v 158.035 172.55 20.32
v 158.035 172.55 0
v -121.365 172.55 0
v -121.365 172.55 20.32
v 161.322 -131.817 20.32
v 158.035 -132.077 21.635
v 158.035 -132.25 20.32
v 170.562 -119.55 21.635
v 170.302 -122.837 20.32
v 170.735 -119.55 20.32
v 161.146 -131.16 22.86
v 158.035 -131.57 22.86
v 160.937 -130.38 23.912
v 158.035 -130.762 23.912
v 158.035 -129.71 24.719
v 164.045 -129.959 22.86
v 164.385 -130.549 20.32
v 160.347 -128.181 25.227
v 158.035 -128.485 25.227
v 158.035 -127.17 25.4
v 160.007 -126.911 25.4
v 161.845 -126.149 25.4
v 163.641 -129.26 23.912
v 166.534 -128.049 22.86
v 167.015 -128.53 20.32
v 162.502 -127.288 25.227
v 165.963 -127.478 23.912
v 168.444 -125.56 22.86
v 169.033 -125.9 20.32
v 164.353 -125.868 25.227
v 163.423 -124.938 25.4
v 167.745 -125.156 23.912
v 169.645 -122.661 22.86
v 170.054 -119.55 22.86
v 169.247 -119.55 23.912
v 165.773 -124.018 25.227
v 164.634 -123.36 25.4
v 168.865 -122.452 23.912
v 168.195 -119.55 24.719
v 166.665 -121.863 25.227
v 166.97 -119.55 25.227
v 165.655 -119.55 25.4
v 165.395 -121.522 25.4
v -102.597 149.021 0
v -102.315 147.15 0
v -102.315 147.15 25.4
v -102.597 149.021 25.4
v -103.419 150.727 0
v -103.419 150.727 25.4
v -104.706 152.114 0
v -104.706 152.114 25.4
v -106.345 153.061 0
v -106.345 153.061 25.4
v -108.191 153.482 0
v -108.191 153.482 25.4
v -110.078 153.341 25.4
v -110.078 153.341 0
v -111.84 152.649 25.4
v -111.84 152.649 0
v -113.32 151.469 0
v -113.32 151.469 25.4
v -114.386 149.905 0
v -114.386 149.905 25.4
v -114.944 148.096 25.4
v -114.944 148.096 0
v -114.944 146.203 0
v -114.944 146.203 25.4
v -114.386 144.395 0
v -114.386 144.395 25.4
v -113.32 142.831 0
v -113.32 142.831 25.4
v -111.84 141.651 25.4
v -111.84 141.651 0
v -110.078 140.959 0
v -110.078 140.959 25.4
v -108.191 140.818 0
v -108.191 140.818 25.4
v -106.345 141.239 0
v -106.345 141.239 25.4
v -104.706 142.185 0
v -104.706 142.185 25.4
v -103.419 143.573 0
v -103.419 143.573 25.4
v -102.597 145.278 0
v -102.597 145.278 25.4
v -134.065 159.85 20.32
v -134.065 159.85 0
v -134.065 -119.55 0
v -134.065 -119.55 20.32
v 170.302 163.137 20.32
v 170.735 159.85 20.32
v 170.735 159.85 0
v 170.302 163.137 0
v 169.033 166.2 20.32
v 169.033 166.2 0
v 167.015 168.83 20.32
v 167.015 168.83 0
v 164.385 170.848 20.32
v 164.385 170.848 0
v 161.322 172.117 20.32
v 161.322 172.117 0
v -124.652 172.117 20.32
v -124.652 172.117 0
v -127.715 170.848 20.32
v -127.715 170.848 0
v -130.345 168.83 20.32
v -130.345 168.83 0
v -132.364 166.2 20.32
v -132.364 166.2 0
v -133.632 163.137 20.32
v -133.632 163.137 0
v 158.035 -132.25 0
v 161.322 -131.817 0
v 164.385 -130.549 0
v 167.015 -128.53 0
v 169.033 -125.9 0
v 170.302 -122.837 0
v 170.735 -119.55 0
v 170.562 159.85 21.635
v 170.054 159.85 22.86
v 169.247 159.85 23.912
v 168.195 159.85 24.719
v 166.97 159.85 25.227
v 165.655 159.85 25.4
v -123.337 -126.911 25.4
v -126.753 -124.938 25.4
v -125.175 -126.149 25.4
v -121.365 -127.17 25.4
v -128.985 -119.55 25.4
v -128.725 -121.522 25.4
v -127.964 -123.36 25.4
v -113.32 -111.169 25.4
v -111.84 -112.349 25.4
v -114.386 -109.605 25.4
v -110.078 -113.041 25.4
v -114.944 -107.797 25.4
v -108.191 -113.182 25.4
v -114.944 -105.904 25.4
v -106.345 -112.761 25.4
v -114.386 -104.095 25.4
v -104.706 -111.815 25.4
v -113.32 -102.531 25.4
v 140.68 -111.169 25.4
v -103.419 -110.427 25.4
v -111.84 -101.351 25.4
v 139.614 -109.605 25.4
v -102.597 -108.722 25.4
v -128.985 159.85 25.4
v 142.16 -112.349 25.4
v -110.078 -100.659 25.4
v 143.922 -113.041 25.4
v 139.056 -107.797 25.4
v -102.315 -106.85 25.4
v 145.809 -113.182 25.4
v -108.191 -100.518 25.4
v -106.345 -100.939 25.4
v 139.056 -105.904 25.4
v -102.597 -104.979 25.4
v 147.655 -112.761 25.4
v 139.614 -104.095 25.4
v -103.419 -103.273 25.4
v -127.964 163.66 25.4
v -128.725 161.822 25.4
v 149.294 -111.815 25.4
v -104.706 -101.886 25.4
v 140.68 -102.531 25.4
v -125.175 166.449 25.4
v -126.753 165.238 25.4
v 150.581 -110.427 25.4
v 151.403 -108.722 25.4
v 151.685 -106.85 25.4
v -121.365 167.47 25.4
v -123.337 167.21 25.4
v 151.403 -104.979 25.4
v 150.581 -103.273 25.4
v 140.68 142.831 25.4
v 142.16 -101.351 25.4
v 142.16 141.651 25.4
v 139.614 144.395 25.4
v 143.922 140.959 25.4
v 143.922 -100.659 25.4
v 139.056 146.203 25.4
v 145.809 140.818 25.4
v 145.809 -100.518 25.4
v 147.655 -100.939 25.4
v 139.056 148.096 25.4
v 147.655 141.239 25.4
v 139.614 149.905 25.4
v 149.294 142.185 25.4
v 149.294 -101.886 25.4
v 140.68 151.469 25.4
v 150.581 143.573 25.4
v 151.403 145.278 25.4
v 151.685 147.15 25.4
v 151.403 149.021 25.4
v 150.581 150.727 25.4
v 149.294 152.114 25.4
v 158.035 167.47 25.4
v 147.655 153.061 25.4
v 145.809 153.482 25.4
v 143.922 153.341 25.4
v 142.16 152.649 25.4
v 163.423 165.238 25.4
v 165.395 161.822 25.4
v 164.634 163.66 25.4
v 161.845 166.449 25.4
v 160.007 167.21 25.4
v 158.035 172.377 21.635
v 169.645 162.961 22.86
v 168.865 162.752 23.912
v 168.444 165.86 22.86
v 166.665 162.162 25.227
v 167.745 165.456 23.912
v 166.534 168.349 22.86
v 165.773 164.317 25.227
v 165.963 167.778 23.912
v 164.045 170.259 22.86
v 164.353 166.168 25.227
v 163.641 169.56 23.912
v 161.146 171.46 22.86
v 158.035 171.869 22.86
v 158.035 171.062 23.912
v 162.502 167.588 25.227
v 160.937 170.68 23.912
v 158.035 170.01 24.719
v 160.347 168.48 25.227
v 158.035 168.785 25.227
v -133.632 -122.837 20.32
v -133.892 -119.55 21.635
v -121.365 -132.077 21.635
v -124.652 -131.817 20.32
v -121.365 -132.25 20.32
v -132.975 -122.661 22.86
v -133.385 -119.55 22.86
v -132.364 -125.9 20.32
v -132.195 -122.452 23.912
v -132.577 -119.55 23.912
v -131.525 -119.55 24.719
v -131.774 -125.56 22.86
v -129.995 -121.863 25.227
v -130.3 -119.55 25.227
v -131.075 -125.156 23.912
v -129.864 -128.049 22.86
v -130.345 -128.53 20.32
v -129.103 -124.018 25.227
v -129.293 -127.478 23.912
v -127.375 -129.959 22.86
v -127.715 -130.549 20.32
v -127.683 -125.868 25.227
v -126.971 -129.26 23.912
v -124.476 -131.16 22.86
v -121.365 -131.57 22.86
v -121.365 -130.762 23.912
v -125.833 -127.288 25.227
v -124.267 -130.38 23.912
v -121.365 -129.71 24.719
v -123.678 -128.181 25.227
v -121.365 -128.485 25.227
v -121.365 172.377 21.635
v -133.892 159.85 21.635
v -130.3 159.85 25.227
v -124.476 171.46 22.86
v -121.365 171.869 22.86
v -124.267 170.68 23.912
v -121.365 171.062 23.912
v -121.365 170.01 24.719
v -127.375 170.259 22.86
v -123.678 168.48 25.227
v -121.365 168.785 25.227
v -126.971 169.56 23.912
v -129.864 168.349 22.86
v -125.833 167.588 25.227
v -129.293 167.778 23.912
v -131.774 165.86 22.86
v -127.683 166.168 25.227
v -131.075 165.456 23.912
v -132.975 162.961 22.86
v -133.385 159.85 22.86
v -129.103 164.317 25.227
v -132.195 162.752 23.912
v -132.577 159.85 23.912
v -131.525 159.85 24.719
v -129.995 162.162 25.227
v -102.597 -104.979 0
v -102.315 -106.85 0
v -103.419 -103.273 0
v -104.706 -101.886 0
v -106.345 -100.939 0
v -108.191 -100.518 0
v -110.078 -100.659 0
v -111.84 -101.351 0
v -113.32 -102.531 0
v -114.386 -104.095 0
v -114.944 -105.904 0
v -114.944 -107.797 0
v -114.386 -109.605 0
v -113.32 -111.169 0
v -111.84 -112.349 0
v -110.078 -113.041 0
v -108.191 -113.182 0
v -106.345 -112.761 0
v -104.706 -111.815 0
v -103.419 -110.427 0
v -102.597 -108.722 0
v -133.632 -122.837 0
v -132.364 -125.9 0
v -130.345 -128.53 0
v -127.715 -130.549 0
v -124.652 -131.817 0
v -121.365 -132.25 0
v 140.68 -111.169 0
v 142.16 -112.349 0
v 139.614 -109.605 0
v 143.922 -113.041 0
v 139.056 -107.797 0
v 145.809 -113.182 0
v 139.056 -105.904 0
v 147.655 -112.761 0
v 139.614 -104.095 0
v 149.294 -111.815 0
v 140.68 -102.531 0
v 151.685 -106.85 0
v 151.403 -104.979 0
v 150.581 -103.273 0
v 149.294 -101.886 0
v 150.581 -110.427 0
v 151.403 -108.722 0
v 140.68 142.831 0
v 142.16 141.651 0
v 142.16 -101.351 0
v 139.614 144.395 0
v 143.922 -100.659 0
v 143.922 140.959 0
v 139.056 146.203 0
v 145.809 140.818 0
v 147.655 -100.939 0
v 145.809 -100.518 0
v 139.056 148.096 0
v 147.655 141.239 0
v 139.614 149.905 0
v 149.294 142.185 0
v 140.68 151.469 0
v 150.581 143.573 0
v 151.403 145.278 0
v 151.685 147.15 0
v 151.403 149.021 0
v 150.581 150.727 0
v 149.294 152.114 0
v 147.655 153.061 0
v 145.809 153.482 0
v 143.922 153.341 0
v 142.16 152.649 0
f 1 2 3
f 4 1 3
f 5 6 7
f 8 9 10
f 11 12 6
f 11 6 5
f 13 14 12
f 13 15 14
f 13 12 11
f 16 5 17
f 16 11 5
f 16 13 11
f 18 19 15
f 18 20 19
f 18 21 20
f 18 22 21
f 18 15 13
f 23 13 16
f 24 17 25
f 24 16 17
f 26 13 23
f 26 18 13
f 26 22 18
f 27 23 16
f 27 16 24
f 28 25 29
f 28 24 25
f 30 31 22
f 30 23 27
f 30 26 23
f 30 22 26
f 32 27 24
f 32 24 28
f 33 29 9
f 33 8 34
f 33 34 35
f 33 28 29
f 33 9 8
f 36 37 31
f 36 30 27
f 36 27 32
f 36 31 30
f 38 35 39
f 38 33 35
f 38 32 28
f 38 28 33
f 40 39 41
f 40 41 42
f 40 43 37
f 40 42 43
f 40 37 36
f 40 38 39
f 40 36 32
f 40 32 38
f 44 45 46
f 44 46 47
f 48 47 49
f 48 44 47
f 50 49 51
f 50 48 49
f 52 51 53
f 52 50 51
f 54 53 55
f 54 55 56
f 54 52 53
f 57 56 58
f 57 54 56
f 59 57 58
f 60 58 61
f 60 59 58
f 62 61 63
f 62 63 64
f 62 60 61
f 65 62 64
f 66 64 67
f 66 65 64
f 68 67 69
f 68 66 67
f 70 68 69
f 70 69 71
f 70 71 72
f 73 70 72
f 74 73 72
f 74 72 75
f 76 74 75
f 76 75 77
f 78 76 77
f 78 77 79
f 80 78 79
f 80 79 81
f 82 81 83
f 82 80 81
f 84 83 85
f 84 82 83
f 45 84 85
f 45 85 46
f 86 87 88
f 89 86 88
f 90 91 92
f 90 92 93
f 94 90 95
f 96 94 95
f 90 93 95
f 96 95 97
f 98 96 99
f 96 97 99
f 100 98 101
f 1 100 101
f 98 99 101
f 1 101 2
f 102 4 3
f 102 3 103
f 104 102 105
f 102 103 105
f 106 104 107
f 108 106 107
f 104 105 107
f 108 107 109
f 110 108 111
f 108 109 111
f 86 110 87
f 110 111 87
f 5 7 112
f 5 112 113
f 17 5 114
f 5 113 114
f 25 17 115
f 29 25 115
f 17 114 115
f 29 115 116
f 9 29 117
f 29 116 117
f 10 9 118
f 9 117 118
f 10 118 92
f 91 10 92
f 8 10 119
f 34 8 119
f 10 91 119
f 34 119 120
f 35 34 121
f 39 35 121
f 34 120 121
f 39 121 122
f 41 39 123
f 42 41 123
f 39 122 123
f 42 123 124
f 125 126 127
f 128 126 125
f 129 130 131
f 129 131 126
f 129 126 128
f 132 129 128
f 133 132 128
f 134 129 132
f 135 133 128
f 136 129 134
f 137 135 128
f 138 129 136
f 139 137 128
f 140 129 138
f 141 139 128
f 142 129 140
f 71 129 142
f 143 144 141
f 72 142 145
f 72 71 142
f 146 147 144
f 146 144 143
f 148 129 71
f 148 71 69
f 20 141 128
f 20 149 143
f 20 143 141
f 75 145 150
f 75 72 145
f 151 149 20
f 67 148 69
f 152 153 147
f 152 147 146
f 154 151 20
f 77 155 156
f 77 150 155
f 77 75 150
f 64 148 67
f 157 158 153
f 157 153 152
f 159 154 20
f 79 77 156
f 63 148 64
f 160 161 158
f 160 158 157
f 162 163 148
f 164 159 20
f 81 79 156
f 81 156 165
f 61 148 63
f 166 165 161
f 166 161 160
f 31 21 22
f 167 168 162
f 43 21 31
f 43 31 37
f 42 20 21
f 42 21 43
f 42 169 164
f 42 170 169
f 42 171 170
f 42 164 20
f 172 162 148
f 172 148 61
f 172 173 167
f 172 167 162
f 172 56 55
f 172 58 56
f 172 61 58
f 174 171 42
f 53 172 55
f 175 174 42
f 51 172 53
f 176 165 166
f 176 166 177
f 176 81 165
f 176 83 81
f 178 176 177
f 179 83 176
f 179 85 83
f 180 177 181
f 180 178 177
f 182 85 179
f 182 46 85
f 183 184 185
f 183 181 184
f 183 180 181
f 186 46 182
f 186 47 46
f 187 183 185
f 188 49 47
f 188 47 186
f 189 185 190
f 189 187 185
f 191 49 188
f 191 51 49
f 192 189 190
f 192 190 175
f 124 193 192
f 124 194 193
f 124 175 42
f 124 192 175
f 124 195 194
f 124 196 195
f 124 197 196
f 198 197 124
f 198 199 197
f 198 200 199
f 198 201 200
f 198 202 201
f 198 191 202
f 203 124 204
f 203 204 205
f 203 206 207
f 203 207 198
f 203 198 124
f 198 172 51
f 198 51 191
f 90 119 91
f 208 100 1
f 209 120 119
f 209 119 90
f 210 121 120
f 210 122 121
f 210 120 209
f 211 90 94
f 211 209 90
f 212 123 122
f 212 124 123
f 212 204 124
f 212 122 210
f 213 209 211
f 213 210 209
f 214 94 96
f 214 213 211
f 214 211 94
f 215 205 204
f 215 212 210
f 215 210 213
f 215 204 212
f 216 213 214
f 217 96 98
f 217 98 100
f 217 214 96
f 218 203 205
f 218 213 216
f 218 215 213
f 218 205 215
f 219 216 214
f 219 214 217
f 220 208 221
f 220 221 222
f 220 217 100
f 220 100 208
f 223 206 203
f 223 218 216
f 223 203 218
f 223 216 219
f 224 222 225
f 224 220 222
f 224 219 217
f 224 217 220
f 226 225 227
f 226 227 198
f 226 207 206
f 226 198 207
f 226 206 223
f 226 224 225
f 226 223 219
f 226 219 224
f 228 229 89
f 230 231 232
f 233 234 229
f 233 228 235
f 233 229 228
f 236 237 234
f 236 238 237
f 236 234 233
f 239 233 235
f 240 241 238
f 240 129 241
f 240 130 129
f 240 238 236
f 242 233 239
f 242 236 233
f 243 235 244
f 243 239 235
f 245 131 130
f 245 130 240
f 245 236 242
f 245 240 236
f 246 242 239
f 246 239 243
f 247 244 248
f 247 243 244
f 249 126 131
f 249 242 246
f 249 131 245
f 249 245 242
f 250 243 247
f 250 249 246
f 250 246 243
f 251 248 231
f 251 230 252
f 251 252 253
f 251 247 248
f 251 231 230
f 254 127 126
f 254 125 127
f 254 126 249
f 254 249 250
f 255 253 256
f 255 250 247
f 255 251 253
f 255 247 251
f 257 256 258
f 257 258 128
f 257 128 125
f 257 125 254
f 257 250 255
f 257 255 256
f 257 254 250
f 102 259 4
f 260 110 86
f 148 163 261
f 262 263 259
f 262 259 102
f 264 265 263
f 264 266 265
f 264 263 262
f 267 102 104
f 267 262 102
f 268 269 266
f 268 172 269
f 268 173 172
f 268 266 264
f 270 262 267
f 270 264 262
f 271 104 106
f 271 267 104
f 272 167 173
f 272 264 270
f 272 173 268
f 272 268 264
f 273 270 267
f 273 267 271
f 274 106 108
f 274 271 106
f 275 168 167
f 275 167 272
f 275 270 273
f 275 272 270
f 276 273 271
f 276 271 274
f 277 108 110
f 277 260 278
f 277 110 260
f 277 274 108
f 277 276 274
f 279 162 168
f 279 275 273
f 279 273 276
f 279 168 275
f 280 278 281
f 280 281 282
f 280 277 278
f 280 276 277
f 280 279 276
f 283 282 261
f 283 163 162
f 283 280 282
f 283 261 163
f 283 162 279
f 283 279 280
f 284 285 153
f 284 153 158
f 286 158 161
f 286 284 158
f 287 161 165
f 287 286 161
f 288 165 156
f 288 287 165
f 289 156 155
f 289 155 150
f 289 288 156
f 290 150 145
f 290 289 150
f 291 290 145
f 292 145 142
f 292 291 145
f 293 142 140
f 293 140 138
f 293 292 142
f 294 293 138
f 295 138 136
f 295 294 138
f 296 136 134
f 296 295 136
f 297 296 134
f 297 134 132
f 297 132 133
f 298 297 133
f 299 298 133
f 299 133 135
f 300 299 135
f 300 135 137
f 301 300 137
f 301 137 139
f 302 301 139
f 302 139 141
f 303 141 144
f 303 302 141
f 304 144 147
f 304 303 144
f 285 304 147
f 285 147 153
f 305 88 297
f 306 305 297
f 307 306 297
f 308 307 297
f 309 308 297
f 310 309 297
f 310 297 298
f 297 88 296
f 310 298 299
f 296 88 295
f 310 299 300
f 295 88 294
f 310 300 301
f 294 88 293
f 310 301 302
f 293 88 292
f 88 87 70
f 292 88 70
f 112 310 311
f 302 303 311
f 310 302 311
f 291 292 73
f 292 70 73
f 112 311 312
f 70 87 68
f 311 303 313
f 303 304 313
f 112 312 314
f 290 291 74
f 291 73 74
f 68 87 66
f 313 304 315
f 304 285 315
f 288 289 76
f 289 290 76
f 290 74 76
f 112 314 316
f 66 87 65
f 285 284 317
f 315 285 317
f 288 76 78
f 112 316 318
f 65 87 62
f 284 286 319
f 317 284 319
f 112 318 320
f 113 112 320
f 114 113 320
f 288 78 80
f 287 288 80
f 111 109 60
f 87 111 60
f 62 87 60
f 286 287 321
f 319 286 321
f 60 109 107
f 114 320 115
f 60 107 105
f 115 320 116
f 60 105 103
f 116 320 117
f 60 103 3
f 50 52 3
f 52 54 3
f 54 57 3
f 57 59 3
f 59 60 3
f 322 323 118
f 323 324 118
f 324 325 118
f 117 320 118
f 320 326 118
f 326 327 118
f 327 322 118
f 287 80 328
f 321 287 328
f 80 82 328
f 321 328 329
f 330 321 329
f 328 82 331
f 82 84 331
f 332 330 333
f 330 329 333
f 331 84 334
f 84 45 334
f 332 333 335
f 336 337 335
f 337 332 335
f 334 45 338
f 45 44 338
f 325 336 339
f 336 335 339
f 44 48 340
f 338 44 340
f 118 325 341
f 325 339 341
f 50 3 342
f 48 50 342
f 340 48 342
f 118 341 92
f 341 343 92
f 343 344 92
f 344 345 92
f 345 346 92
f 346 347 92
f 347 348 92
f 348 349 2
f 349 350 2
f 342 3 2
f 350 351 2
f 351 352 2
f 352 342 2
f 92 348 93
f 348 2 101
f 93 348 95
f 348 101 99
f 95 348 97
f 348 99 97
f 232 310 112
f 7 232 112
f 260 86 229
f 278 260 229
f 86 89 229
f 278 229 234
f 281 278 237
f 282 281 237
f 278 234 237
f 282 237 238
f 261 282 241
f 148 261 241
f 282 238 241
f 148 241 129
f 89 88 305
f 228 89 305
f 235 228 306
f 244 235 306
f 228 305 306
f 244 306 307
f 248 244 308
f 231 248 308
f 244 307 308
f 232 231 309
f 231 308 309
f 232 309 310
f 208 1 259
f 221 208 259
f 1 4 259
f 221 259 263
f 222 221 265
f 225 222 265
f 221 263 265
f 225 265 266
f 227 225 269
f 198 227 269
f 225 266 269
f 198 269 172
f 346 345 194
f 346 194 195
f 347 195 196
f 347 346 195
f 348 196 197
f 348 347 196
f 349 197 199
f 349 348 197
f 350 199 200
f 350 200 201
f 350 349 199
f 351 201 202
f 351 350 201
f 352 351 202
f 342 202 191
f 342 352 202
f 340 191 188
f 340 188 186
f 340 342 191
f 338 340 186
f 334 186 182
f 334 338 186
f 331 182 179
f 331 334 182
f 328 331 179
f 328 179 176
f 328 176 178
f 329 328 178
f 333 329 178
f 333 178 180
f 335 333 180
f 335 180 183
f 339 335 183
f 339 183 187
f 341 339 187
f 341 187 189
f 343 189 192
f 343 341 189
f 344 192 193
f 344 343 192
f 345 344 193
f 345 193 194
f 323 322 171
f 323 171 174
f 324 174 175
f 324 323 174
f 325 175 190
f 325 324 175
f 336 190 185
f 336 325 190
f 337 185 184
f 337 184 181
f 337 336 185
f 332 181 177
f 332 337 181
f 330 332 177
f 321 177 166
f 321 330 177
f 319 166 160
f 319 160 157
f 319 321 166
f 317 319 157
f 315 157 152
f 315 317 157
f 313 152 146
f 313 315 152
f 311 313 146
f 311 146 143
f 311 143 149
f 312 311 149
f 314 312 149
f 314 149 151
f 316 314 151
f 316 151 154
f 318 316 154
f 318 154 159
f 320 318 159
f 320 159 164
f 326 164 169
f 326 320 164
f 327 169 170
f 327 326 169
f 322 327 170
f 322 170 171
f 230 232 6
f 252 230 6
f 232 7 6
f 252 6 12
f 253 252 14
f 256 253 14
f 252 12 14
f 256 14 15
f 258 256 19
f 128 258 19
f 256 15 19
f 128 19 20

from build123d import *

# Parameters (mm, degrees)
F0_R     = 6.35
F1_DEPTH = 25.4
F2_R     = 5.08


with BuildPart() as f1:
    # F0 (on Top) → F1 (new body)
    with BuildSketch(Plane.XY):
        with BuildLine():
            Line((158.034882, 172.549802), (-121.365118, 172.549802))
            ThreePointArc((-121.365118, 172.549802), (-130.345374, 168.830058), (-134.065118, 159.849802))
            Line((-134.065118, 159.849802), (-134.065118, -119.550198))
            ThreePointArc((-134.065118, -119.550198), (-130.345374, -128.530454), (-121.365118, -132.250198))
            Line((-121.365118, -132.250198), (158.034882, -132.250198))
            ThreePointArc((158.034882, -132.250198), (167.015138, -128.530454), (170.734882, -119.550198))
            Line((170.734882, -119.550198), (170.734882, 159.849802))
            ThreePointArc((170.734882, 159.849802), (167.015138, 168.830058), (158.034882, 172.549802))
        make_face()
        with Locations((-108.665118, -106.850198)):
            Circle(F0_R, mode=Mode.SUBTRACT)
        with Locations((145.334882, -106.850198)):
            Circle(F0_R, mode=Mode.SUBTRACT)
        with Locations((-108.665118, 147.149802)):
            Circle(F0_R, mode=Mode.SUBTRACT)
        with Locations((145.334882, 147.149802)):
            Circle(F0_R, mode=Mode.SUBTRACT)
    extrude(amount=F1_DEPTH)

    # F2
    f2_edges = [f1.edges().sort_by_distance(p)[0] for p in [
        (-134.065118, 20.149802, 25.4),
        (-130.345374, -128.530454, 25.4),
        (18.334882, -132.250198, 25.4),
        (167.015138, -128.530454, 25.4),
        (170.734882, 20.149802, 25.4),
        (167.015138, 168.830058, 25.4),
        (18.334882, 172.549802, 25.4),
        (-130.345374, 168.830058, 25.4),
    ]]
    fillet(f2_edges, radius=F2_R)


solid = f1.part
